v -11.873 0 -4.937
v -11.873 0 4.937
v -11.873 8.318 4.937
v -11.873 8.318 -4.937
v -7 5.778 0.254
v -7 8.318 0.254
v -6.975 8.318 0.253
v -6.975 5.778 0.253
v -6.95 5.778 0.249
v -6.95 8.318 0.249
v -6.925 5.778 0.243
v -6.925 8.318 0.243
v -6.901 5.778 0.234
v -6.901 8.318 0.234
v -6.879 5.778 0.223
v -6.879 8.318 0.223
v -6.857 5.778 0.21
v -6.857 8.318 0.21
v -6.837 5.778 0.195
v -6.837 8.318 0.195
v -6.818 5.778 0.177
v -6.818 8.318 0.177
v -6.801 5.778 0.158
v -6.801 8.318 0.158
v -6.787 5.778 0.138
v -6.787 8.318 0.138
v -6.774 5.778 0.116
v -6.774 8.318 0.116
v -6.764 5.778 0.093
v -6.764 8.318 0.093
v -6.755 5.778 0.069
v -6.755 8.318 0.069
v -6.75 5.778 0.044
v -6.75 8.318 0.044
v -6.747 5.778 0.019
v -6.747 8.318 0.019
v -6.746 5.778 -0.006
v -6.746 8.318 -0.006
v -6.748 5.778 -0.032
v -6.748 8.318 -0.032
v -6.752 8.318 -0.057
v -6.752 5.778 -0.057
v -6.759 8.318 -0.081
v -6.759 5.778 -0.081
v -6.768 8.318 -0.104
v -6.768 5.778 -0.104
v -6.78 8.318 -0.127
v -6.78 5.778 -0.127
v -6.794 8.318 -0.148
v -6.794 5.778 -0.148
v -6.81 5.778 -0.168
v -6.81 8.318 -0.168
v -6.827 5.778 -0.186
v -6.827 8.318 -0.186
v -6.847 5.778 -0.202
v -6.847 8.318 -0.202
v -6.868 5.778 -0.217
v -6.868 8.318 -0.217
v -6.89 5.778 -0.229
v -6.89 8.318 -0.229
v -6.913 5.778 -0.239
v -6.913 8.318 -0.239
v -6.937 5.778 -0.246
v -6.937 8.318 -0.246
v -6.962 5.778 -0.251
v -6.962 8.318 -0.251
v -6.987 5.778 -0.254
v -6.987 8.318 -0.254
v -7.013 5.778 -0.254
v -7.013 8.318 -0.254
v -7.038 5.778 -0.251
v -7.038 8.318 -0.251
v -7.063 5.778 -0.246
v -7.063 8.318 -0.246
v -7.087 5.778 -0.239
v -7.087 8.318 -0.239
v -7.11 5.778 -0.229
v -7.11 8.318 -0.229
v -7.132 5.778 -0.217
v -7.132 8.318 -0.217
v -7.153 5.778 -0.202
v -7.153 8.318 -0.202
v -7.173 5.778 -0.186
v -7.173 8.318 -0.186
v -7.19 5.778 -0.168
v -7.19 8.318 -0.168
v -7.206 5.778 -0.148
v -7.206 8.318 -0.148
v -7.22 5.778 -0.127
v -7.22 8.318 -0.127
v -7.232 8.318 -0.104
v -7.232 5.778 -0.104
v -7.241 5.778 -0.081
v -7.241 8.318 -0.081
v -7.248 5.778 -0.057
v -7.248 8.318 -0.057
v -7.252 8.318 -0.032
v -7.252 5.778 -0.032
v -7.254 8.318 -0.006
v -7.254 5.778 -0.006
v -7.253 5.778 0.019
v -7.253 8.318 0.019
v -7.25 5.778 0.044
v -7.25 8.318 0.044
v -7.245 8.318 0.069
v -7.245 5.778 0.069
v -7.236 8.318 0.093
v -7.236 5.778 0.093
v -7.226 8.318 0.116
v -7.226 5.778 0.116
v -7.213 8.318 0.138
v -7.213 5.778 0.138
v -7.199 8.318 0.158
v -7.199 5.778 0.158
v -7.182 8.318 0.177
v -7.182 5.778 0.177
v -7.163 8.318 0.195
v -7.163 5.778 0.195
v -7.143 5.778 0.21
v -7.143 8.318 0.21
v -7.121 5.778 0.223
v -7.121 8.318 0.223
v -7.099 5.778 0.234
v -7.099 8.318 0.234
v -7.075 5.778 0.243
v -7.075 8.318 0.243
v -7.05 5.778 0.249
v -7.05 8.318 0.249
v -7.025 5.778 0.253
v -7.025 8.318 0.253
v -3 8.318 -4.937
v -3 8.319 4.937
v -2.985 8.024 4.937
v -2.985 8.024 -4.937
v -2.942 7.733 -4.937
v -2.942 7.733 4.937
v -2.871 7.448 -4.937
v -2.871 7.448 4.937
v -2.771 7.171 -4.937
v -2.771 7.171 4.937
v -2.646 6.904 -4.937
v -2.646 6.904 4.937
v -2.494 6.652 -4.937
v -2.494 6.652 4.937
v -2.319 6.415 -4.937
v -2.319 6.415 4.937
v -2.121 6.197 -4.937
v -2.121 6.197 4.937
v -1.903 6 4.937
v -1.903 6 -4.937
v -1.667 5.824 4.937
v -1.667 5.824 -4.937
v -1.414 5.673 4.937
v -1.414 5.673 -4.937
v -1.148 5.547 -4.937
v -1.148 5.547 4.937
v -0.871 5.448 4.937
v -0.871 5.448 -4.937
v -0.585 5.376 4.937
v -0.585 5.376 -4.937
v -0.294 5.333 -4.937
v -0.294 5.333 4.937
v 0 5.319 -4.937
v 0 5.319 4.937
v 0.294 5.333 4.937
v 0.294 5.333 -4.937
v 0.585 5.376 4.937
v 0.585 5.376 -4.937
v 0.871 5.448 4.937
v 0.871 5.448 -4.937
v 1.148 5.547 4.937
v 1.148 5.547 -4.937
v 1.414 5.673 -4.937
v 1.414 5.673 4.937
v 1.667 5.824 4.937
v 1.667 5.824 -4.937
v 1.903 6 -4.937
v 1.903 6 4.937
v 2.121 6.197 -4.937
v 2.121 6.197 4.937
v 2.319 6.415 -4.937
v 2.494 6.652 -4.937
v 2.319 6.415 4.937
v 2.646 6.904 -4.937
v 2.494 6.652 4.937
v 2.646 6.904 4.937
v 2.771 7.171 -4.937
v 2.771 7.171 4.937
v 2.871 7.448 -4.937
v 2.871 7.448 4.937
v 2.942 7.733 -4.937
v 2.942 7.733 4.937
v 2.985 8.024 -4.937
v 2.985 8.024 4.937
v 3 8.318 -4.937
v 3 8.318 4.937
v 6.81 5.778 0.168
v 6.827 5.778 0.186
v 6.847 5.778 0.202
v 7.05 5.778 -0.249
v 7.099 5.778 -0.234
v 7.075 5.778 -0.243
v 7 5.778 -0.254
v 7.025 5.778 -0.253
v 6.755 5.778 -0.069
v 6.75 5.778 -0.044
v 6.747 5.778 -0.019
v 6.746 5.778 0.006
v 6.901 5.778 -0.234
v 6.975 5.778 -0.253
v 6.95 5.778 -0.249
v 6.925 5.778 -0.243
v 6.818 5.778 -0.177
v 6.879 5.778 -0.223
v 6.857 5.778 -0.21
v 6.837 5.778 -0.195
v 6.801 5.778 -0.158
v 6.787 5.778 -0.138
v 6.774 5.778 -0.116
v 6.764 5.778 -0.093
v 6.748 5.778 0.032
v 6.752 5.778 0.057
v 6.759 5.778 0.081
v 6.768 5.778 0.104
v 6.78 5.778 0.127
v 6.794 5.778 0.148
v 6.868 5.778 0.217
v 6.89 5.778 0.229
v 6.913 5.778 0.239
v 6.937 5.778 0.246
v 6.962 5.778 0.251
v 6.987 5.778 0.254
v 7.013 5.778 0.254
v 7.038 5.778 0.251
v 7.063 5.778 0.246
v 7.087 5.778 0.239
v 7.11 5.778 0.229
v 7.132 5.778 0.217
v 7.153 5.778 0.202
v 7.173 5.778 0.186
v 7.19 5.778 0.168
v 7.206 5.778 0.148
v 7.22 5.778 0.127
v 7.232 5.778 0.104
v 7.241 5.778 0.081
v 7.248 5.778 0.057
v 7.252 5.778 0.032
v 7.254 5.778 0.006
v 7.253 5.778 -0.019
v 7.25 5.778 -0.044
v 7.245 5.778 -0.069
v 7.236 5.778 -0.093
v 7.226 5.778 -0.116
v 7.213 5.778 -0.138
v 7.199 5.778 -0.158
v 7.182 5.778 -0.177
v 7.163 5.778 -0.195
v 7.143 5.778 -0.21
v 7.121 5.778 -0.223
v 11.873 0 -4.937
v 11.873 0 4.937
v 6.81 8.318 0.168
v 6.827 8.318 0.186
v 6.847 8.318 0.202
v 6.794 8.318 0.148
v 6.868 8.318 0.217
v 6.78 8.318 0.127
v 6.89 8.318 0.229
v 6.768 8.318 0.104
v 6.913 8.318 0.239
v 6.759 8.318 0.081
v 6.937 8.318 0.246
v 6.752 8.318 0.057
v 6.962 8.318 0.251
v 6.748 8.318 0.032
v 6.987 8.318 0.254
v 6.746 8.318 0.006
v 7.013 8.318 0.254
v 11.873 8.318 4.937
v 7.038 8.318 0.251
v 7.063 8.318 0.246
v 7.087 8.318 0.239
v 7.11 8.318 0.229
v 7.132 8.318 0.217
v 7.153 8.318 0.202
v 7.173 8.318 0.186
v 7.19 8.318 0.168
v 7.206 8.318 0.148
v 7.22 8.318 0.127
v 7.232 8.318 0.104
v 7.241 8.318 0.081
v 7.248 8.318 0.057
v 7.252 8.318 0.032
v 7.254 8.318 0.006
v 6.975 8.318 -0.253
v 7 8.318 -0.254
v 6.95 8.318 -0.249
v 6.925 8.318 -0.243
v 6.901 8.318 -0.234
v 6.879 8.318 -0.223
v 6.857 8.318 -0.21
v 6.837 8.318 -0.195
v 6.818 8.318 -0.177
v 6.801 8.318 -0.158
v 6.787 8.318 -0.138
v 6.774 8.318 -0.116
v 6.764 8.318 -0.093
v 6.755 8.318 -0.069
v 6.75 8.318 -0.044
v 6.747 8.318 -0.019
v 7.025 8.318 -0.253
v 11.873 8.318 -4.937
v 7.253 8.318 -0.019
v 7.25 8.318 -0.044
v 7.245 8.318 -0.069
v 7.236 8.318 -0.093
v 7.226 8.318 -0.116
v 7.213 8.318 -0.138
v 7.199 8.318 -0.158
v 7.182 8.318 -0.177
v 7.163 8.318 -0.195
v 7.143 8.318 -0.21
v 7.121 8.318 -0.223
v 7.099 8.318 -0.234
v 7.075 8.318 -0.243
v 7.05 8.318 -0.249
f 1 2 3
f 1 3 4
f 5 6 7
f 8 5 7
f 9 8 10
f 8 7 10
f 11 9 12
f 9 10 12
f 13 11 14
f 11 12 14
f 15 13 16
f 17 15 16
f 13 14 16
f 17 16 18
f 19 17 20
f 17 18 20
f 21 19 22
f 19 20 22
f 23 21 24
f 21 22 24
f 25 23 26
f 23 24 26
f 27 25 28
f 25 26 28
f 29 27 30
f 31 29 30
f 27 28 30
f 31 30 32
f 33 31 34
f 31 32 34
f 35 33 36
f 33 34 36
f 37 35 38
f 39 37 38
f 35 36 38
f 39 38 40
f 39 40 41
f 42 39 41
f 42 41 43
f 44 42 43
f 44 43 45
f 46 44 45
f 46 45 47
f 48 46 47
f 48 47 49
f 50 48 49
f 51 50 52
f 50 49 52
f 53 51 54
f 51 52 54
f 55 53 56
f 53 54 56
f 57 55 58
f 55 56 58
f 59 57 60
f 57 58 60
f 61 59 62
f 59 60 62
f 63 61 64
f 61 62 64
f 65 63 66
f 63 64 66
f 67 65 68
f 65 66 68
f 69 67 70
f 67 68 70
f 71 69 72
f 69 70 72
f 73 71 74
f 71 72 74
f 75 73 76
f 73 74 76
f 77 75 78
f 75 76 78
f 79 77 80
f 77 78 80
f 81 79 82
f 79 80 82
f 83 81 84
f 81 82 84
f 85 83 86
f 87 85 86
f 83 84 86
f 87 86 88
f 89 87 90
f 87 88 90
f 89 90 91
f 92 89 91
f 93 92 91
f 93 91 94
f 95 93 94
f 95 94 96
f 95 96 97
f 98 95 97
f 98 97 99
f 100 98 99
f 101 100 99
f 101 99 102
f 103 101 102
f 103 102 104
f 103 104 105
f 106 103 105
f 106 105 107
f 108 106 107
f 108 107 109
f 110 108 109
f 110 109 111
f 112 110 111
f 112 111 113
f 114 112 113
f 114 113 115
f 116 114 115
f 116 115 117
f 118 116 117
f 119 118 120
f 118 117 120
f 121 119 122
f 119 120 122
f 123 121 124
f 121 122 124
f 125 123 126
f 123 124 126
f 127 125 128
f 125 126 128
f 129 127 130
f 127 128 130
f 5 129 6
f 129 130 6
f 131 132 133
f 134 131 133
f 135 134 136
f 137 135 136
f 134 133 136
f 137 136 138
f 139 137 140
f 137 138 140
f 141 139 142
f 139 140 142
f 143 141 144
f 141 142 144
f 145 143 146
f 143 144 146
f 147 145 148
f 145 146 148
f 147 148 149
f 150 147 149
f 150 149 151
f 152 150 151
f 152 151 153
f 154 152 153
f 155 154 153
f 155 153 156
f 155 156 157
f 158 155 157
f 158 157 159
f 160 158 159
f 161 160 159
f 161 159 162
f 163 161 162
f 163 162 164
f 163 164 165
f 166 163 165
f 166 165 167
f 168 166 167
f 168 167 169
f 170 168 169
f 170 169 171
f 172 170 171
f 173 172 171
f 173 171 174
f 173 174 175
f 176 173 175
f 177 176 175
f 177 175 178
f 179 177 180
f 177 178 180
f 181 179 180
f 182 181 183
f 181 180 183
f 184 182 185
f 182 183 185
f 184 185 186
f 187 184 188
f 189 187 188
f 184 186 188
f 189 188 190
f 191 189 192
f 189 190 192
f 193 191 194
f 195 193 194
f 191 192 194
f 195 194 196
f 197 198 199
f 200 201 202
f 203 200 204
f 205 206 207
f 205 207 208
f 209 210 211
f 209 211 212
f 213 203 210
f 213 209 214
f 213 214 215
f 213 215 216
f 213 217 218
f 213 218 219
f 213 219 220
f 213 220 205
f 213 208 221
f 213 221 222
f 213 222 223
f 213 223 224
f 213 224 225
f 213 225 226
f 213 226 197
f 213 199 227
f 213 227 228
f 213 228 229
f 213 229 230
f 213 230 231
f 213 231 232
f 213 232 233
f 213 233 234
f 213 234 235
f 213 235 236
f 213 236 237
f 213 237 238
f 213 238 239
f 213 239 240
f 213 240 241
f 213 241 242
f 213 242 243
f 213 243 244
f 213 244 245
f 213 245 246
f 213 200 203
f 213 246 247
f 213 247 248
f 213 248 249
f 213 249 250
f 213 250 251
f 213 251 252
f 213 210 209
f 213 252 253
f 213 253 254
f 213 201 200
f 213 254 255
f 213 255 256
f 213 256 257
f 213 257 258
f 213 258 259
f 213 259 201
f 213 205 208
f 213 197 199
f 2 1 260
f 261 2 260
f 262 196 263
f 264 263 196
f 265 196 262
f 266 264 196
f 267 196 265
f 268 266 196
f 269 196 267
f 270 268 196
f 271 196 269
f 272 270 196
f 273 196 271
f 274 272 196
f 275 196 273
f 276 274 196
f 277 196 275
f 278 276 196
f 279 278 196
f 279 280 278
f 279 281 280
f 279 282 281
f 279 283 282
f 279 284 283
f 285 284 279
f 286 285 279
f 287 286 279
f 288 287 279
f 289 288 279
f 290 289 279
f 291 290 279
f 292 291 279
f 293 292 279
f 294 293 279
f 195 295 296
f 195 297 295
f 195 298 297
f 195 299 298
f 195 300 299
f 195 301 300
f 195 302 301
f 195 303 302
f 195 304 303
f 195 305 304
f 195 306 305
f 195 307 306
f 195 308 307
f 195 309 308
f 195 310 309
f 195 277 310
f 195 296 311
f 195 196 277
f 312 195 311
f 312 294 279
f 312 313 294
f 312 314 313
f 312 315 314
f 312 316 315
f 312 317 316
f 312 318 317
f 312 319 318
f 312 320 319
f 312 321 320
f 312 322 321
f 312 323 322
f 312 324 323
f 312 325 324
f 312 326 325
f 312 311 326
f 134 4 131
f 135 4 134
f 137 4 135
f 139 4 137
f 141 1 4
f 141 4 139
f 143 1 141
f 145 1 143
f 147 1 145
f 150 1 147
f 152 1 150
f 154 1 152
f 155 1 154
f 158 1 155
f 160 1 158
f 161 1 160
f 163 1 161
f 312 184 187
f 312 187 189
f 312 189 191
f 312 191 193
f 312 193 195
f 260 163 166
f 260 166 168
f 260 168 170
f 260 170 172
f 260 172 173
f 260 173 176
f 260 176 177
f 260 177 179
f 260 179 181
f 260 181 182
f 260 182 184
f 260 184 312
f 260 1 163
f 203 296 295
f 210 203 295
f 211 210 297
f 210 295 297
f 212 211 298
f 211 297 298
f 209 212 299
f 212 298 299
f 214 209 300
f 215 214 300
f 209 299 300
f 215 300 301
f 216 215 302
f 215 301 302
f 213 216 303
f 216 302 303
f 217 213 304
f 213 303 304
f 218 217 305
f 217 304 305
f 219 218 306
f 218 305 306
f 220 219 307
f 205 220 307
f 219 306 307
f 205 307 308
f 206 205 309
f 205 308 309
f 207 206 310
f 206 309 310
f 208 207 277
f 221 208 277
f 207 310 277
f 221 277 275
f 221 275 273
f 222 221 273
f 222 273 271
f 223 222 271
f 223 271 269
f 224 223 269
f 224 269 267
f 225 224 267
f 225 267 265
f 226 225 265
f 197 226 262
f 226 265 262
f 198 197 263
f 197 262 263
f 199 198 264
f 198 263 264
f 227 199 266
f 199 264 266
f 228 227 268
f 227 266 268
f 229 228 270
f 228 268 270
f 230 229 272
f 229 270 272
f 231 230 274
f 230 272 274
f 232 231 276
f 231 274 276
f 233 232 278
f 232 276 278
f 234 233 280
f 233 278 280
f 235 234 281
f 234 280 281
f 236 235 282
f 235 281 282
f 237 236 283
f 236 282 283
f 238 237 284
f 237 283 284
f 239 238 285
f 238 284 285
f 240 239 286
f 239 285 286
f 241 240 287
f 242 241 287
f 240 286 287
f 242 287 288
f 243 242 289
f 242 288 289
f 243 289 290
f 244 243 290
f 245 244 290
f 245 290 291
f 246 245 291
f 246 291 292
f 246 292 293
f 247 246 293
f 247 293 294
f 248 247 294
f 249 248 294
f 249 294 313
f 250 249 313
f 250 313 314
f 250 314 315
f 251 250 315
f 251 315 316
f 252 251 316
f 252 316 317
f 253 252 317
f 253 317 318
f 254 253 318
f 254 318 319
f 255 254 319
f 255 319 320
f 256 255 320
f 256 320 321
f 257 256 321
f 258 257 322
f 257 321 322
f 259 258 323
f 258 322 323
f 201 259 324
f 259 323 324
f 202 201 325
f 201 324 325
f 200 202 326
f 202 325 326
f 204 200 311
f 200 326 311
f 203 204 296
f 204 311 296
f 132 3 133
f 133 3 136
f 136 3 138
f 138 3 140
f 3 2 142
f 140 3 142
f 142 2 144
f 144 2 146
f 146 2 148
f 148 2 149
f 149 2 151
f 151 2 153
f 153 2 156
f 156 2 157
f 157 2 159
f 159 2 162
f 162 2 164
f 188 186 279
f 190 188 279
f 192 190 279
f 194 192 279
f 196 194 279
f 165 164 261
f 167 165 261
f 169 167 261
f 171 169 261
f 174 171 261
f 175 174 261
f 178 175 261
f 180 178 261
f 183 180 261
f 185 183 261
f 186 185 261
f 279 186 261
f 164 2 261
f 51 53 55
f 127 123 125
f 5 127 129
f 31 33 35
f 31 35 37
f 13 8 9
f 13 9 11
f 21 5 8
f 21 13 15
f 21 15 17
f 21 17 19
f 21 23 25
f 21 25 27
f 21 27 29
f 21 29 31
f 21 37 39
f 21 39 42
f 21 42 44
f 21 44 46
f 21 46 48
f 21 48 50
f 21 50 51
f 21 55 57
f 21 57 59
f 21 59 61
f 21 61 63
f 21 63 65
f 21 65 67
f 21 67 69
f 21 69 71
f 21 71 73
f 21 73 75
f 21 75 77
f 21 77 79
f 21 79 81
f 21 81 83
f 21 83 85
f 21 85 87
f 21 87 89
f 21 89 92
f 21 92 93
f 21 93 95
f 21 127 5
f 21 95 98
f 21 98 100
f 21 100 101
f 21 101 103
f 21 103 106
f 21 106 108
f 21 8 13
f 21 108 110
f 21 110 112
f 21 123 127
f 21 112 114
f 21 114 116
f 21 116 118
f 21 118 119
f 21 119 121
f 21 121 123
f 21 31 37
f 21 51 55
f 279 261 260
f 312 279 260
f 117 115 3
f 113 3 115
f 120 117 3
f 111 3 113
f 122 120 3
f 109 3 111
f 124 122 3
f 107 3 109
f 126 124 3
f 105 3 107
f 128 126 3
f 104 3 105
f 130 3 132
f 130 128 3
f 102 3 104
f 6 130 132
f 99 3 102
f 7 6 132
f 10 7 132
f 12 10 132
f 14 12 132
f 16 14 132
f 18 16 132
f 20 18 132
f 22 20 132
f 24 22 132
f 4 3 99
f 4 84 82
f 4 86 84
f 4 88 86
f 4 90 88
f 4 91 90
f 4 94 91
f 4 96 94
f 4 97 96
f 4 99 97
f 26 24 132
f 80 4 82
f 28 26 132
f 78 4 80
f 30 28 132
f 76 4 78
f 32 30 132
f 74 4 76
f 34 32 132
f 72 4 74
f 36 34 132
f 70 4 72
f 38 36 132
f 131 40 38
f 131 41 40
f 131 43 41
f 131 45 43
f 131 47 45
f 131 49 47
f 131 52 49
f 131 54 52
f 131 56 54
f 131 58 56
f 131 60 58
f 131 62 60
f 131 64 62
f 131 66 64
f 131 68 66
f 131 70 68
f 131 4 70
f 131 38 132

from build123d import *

# Parameters (mm, degrees)
SKETCH2_W           = 23.74600026
SKETCH2_H           = 9.873000066
BOSS_EXTRUDE1_DEPTH = 8.3185
SKETCH3_R           = 2.99974
CUT_EXTRUDE1_DEPTH  = 18.539717918
SKETCH4_R           = 0.254
CUT_EXTRUDE2_DEPTH  = 2.54


with BuildPart() as part:
    # Sketch2 → Boss-Extrude1 (new body)
    with BuildSketch(Plane(origin=(0, 0, 0), x_dir=(1, 0, 0), z_dir=(0, 1, 0))):
        Rectangle(SKETCH2_W, SKETCH2_H)
    extrude(amount=BOSS_EXTRUDE1_DEPTH)

    # Sketch3 → Cut-Extrude1 (cut, through all)
    with BuildSketch(Plane.XY.offset(4.936500033)):
        with Locations((0, 8.3185)):
            Circle(SKETCH3_R)
    extrude(amount=-CUT_EXTRUDE1_DEPTH, mode=Mode.SUBTRACT)

    # Sketch4 → Cut-Extrude2 (cut)
    with BuildSketch(Plane(origin=(0, 8.3185, 0), x_dir=(1, 0, 0), z_dir=(0, 1, 0))):
        with Locations(Location((-6.99999997, 0, 0), (0, 0, 270))):
            Circle(SKETCH4_R)
        with Locations(Location((6.99999997, 0, 0), (0, 0, 90))):
            Circle(SKETCH4_R)
    extrude(amount=-CUT_EXTRUDE2_DEPTH, mode=Mode.SUBTRACT)


solid = part.part
